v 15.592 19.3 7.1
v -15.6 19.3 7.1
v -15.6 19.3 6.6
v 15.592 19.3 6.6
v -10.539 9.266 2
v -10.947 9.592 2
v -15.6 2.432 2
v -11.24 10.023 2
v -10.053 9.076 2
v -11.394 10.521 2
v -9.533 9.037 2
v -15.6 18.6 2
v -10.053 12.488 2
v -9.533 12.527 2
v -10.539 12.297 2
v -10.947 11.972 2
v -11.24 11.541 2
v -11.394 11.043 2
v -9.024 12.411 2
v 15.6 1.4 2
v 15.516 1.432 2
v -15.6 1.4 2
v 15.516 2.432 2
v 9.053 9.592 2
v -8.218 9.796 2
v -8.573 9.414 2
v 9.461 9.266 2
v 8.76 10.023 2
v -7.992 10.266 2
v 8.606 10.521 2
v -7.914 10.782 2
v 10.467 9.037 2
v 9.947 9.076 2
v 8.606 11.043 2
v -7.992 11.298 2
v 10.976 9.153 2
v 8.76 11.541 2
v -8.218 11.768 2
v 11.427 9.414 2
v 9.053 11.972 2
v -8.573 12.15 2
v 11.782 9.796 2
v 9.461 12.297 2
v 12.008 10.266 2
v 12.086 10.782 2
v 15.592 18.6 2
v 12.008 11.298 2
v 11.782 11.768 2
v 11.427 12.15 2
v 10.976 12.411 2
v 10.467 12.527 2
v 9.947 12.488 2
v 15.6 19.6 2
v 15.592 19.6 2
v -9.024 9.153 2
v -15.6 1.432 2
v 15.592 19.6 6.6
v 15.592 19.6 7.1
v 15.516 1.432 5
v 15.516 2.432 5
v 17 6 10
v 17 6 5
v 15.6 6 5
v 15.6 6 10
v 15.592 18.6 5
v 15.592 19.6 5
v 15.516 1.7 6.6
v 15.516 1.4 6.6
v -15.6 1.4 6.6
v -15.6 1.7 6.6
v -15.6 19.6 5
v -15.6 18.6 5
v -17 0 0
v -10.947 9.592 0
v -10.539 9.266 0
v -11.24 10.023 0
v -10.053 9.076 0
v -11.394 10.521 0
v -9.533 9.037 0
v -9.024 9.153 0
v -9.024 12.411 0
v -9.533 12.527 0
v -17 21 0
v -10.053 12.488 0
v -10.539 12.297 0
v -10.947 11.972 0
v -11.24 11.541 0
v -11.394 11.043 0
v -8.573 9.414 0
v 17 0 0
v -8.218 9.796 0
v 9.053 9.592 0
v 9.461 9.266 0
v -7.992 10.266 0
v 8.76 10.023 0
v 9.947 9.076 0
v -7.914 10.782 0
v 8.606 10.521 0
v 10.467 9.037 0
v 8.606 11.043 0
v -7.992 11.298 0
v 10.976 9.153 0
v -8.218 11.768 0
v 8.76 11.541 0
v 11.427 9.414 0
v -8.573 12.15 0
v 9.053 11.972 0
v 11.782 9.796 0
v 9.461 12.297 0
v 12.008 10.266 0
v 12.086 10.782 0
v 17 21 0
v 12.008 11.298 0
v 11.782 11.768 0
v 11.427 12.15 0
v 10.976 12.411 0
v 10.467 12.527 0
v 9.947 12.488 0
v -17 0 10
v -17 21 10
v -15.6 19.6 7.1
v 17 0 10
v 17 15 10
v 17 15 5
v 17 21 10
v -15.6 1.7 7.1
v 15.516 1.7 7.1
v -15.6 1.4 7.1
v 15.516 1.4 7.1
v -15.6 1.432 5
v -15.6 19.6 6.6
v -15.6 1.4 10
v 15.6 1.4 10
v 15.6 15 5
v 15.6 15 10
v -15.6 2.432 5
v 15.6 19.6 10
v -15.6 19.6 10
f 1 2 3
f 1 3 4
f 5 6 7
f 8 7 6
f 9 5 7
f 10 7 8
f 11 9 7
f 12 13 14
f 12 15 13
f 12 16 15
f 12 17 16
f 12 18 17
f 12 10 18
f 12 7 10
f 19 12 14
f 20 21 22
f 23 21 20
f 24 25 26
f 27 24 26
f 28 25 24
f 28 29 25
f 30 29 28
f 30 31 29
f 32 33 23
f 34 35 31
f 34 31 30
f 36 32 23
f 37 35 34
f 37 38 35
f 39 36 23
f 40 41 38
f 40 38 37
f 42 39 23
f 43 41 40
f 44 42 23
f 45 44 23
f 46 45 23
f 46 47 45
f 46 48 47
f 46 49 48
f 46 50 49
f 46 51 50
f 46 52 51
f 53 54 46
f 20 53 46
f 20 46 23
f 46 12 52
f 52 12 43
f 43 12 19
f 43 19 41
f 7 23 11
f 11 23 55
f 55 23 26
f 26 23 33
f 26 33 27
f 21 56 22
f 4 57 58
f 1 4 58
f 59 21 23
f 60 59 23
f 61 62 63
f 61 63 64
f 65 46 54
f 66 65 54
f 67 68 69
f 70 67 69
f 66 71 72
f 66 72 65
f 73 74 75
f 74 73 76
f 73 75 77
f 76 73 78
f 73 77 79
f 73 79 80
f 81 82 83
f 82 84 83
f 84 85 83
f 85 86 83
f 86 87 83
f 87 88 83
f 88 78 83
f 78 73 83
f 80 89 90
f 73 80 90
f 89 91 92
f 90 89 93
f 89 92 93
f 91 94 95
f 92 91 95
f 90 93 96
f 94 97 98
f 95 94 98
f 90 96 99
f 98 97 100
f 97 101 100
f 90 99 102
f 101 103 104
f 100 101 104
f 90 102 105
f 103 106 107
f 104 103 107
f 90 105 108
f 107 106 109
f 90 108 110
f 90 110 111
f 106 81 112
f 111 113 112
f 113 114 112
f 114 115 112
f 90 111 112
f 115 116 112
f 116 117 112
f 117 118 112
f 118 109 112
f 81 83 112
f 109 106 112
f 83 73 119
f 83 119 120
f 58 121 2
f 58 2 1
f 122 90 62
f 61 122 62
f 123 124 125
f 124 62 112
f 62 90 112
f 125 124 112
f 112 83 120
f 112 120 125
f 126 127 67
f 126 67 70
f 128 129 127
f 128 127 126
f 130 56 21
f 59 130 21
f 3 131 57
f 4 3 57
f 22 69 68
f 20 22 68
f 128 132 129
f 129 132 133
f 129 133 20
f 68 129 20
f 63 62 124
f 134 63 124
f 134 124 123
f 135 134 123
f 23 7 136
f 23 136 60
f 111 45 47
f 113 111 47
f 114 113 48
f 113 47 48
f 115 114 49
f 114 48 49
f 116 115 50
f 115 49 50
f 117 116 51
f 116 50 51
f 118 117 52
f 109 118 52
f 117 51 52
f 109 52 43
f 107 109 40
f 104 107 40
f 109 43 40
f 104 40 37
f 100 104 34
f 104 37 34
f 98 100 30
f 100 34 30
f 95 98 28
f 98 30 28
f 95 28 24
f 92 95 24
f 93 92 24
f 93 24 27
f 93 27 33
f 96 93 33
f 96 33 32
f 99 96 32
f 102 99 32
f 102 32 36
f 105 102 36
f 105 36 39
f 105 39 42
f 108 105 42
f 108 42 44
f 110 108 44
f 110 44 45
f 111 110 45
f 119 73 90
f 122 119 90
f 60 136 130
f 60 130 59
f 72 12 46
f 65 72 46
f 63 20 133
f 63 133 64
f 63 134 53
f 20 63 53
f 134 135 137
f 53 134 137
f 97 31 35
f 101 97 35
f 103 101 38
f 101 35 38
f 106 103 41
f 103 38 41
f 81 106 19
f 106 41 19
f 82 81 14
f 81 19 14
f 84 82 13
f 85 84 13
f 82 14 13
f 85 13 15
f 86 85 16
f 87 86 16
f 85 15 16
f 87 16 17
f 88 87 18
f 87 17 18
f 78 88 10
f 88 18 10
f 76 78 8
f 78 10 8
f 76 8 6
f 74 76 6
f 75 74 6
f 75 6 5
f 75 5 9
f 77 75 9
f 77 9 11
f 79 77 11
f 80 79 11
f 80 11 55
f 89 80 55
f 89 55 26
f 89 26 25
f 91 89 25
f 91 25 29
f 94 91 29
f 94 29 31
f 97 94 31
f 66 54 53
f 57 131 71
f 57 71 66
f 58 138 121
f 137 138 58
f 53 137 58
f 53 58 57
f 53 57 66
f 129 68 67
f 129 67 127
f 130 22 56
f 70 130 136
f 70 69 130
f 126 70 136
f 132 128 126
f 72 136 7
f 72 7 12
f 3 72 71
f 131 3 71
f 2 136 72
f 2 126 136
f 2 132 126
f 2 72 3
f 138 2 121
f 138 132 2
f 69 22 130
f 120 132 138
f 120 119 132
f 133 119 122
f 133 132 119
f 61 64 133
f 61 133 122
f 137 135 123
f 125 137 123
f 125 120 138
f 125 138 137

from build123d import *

# Parameters (mm, degrees)
SKETCH_W        = 34
SKETCH_H        = 21
PAD_DEPTH       = 10
SKETCH001_W     = 31.2
SKETCH001_H     = 18.2
POCKET_DEPTH    = 8
SKETCH002_W     = 31.192015
SKETCH002_H     = 1
PAD001_DEPTH    = 3
SKETCH003_W     = 31.192015
SKETCH003_H     = 1
PAD002_DEPTH    = 3
SKETCH004_W     = 9
SKETCH004_H     = 5
POCKET001_DEPTH = 5
SKETCH005_W     = 31.192015
SKETCH005_H     = 0.5
PAD003_DEPTH    = 0.3
SKETCH006_W     = 31.116258
SKETCH006_H     = 0.5
PAD004_DEPTH    = 0.3
SKETCH007_R     = 1.75
POCKET002_DEPTH = 5


with BuildPart() as part:
    # Sketch → Pad (new body)
    with BuildSketch(Plane.XY):
        with Locations((0, 10.5)):
            Rectangle(SKETCH_W, SKETCH_H)
    extrude(amount=PAD_DEPTH)

    # Sketch001 (on Face6 of Pad) → Pocket (cut)
    with BuildSketch(Plane.XY.offset(10)):
        with Locations((0, 10.5)):
            Rectangle(SKETCH001_W, SKETCH001_H)
    extrude(amount=-POCKET_DEPTH, mode=Mode.SUBTRACT)

    # Sketch002 (on Face11 of Pocket) → Pad001 (join)
    with BuildSketch(Plane.XY.offset(2)):
        with Locations((-0.0039925, 19.1)):
            Rectangle(SKETCH002_W, SKETCH002_H)
    extrude(amount=PAD001_DEPTH)

    # Sketch003 (on Face13 of Pad001) → Pad002 (join)
    with BuildSketch(Plane.XY.offset(2)):
        with Locations((-0.0797495, 1.931894)):
            Rectangle(SKETCH003_W, SKETCH003_H)
    extrude(amount=PAD002_DEPTH)

    # Sketch004 (on Face3 of Pad002) → Pocket001 (cut)
    with BuildSketch(Plane.YZ.offset(17)):
        with Locations((10.5, 7.5)):
            Rectangle(SKETCH004_W, SKETCH004_H)
    extrude(amount=-POCKET001_DEPTH, mode=Mode.SUBTRACT)

    # Sketch005 (on Face11 of Pocket001) → Pad003 (join)
    with BuildSketch(Plane.XZ.offset(-19.6)):
        with Locations((-0.0039925, 6.85)):
            Rectangle(SKETCH005_W, SKETCH005_H)
    extrude(amount=PAD003_DEPTH)

    # Sketch006 (on Face13 of Pad003) → Pad004 (join)
    with BuildSketch(Plane(origin=(0, 1.4, 0), x_dir=(-1, 0, 0), z_dir=(0, 1, 0))):
        with Locations((0.041871, 6.85)):
            Rectangle(SKETCH006_W, SKETCH006_H)
    extrude(amount=PAD004_DEPTH)

    # Sketch007 (on Face14 of Pad004) → Pocket002 (cut)
    with BuildSketch(Plane.XY.offset(2)):
        with Locations((-9.6637815806, 10.781894)):
            Circle(SKETCH007_R)
        with Locations((10.3362184194, 10.781894)):
            Circle(SKETCH007_R)
    extrude(amount=-POCKET002_DEPTH, mode=Mode.SUBTRACT)


solid = part.part
